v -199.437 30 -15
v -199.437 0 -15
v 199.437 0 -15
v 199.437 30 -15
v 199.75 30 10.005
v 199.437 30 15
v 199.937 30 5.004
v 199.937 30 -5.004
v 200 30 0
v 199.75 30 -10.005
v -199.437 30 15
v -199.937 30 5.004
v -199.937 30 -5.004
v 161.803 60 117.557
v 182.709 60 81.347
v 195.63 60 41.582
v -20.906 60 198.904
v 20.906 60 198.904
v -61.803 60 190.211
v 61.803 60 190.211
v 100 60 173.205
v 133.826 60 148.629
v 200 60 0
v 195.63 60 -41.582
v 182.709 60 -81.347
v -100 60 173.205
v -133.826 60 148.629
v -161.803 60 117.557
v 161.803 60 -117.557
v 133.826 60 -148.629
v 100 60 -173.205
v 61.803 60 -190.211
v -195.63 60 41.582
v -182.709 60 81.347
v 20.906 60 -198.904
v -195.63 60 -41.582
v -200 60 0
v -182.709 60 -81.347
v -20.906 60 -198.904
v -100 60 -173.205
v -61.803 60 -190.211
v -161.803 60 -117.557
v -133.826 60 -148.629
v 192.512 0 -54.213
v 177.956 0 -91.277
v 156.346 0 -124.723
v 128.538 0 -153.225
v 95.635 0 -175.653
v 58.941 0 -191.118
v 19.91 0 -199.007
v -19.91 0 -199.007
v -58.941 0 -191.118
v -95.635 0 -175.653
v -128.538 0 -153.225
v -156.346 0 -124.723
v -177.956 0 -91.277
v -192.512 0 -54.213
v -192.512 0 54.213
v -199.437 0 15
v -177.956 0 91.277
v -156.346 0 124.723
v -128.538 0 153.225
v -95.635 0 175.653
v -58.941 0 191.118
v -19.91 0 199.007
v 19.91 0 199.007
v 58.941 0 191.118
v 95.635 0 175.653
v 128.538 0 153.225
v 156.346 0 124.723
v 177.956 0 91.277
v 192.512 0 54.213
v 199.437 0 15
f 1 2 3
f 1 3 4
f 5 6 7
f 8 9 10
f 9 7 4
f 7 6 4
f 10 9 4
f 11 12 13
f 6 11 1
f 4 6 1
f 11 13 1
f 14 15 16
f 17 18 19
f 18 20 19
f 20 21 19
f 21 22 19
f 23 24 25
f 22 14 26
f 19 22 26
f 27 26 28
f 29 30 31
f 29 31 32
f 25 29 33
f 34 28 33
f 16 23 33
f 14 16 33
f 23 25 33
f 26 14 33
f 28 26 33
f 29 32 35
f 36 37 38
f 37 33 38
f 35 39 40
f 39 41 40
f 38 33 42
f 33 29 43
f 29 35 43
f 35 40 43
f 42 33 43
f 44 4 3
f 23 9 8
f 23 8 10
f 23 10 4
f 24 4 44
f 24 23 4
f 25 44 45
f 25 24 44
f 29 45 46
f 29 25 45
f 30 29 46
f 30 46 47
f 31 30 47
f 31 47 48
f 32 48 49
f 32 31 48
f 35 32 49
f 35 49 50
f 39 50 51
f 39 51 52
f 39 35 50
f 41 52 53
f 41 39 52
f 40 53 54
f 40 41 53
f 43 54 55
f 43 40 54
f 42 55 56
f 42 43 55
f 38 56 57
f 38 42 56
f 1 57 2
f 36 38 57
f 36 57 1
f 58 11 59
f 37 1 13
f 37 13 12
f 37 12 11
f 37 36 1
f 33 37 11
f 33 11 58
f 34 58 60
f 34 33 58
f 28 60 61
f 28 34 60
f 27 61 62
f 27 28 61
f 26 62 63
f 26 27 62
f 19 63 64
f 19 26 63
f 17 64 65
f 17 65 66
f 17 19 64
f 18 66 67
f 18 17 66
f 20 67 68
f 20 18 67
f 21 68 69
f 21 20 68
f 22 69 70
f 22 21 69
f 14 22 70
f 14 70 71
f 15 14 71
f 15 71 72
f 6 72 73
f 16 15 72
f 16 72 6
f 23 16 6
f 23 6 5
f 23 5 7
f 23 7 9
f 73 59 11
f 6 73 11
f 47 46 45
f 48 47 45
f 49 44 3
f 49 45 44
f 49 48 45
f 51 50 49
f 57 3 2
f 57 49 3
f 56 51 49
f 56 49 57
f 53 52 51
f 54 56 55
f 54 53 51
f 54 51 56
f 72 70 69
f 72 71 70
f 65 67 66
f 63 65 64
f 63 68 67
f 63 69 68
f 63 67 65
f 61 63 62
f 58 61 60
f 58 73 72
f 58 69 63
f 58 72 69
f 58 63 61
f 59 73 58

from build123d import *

# Parameters (mm, degrees)
ESBO_O1_W                  = 200
ESBO_O1_H                  = 60
ESBO_O2_W                  = 30
ESBO_O2_H                  = 30
CORTE_EXTRUS_O1_DEPTH      = 201
CORTE_EXTRUS_O1_DEPTH_BACK = 201


with BuildPart() as part:
    # Esboço1 → Revolução1 (revolve)
    with BuildSketch(Plane.XY):
        with Locations((100, 30)):
            Rectangle(ESBO_O1_W, ESBO_O1_H)
    revolve(axis=Axis((0, 0, 0), (0, 1, 0)))

    # Esboço2 → Corte-extrusão1 (cut, two sides)
    with BuildSketch(Plane(origin=(0, 0, 0), x_dir=(0, 0, -1), z_dir=(1, 0, 0))) as corte_extrus_o1_sk:
        with Locations((0, 15)):
            Rectangle(ESBO_O2_W, ESBO_O2_H)
    extrude(amount=CORTE_EXTRUS_O1_DEPTH, mode=Mode.SUBTRACT)
    extrude(corte_extrus_o1_sk.sketch, amount=-CORTE_EXTRUS_O1_DEPTH_BACK, mode=Mode.SUBTRACT)


solid = part.part
